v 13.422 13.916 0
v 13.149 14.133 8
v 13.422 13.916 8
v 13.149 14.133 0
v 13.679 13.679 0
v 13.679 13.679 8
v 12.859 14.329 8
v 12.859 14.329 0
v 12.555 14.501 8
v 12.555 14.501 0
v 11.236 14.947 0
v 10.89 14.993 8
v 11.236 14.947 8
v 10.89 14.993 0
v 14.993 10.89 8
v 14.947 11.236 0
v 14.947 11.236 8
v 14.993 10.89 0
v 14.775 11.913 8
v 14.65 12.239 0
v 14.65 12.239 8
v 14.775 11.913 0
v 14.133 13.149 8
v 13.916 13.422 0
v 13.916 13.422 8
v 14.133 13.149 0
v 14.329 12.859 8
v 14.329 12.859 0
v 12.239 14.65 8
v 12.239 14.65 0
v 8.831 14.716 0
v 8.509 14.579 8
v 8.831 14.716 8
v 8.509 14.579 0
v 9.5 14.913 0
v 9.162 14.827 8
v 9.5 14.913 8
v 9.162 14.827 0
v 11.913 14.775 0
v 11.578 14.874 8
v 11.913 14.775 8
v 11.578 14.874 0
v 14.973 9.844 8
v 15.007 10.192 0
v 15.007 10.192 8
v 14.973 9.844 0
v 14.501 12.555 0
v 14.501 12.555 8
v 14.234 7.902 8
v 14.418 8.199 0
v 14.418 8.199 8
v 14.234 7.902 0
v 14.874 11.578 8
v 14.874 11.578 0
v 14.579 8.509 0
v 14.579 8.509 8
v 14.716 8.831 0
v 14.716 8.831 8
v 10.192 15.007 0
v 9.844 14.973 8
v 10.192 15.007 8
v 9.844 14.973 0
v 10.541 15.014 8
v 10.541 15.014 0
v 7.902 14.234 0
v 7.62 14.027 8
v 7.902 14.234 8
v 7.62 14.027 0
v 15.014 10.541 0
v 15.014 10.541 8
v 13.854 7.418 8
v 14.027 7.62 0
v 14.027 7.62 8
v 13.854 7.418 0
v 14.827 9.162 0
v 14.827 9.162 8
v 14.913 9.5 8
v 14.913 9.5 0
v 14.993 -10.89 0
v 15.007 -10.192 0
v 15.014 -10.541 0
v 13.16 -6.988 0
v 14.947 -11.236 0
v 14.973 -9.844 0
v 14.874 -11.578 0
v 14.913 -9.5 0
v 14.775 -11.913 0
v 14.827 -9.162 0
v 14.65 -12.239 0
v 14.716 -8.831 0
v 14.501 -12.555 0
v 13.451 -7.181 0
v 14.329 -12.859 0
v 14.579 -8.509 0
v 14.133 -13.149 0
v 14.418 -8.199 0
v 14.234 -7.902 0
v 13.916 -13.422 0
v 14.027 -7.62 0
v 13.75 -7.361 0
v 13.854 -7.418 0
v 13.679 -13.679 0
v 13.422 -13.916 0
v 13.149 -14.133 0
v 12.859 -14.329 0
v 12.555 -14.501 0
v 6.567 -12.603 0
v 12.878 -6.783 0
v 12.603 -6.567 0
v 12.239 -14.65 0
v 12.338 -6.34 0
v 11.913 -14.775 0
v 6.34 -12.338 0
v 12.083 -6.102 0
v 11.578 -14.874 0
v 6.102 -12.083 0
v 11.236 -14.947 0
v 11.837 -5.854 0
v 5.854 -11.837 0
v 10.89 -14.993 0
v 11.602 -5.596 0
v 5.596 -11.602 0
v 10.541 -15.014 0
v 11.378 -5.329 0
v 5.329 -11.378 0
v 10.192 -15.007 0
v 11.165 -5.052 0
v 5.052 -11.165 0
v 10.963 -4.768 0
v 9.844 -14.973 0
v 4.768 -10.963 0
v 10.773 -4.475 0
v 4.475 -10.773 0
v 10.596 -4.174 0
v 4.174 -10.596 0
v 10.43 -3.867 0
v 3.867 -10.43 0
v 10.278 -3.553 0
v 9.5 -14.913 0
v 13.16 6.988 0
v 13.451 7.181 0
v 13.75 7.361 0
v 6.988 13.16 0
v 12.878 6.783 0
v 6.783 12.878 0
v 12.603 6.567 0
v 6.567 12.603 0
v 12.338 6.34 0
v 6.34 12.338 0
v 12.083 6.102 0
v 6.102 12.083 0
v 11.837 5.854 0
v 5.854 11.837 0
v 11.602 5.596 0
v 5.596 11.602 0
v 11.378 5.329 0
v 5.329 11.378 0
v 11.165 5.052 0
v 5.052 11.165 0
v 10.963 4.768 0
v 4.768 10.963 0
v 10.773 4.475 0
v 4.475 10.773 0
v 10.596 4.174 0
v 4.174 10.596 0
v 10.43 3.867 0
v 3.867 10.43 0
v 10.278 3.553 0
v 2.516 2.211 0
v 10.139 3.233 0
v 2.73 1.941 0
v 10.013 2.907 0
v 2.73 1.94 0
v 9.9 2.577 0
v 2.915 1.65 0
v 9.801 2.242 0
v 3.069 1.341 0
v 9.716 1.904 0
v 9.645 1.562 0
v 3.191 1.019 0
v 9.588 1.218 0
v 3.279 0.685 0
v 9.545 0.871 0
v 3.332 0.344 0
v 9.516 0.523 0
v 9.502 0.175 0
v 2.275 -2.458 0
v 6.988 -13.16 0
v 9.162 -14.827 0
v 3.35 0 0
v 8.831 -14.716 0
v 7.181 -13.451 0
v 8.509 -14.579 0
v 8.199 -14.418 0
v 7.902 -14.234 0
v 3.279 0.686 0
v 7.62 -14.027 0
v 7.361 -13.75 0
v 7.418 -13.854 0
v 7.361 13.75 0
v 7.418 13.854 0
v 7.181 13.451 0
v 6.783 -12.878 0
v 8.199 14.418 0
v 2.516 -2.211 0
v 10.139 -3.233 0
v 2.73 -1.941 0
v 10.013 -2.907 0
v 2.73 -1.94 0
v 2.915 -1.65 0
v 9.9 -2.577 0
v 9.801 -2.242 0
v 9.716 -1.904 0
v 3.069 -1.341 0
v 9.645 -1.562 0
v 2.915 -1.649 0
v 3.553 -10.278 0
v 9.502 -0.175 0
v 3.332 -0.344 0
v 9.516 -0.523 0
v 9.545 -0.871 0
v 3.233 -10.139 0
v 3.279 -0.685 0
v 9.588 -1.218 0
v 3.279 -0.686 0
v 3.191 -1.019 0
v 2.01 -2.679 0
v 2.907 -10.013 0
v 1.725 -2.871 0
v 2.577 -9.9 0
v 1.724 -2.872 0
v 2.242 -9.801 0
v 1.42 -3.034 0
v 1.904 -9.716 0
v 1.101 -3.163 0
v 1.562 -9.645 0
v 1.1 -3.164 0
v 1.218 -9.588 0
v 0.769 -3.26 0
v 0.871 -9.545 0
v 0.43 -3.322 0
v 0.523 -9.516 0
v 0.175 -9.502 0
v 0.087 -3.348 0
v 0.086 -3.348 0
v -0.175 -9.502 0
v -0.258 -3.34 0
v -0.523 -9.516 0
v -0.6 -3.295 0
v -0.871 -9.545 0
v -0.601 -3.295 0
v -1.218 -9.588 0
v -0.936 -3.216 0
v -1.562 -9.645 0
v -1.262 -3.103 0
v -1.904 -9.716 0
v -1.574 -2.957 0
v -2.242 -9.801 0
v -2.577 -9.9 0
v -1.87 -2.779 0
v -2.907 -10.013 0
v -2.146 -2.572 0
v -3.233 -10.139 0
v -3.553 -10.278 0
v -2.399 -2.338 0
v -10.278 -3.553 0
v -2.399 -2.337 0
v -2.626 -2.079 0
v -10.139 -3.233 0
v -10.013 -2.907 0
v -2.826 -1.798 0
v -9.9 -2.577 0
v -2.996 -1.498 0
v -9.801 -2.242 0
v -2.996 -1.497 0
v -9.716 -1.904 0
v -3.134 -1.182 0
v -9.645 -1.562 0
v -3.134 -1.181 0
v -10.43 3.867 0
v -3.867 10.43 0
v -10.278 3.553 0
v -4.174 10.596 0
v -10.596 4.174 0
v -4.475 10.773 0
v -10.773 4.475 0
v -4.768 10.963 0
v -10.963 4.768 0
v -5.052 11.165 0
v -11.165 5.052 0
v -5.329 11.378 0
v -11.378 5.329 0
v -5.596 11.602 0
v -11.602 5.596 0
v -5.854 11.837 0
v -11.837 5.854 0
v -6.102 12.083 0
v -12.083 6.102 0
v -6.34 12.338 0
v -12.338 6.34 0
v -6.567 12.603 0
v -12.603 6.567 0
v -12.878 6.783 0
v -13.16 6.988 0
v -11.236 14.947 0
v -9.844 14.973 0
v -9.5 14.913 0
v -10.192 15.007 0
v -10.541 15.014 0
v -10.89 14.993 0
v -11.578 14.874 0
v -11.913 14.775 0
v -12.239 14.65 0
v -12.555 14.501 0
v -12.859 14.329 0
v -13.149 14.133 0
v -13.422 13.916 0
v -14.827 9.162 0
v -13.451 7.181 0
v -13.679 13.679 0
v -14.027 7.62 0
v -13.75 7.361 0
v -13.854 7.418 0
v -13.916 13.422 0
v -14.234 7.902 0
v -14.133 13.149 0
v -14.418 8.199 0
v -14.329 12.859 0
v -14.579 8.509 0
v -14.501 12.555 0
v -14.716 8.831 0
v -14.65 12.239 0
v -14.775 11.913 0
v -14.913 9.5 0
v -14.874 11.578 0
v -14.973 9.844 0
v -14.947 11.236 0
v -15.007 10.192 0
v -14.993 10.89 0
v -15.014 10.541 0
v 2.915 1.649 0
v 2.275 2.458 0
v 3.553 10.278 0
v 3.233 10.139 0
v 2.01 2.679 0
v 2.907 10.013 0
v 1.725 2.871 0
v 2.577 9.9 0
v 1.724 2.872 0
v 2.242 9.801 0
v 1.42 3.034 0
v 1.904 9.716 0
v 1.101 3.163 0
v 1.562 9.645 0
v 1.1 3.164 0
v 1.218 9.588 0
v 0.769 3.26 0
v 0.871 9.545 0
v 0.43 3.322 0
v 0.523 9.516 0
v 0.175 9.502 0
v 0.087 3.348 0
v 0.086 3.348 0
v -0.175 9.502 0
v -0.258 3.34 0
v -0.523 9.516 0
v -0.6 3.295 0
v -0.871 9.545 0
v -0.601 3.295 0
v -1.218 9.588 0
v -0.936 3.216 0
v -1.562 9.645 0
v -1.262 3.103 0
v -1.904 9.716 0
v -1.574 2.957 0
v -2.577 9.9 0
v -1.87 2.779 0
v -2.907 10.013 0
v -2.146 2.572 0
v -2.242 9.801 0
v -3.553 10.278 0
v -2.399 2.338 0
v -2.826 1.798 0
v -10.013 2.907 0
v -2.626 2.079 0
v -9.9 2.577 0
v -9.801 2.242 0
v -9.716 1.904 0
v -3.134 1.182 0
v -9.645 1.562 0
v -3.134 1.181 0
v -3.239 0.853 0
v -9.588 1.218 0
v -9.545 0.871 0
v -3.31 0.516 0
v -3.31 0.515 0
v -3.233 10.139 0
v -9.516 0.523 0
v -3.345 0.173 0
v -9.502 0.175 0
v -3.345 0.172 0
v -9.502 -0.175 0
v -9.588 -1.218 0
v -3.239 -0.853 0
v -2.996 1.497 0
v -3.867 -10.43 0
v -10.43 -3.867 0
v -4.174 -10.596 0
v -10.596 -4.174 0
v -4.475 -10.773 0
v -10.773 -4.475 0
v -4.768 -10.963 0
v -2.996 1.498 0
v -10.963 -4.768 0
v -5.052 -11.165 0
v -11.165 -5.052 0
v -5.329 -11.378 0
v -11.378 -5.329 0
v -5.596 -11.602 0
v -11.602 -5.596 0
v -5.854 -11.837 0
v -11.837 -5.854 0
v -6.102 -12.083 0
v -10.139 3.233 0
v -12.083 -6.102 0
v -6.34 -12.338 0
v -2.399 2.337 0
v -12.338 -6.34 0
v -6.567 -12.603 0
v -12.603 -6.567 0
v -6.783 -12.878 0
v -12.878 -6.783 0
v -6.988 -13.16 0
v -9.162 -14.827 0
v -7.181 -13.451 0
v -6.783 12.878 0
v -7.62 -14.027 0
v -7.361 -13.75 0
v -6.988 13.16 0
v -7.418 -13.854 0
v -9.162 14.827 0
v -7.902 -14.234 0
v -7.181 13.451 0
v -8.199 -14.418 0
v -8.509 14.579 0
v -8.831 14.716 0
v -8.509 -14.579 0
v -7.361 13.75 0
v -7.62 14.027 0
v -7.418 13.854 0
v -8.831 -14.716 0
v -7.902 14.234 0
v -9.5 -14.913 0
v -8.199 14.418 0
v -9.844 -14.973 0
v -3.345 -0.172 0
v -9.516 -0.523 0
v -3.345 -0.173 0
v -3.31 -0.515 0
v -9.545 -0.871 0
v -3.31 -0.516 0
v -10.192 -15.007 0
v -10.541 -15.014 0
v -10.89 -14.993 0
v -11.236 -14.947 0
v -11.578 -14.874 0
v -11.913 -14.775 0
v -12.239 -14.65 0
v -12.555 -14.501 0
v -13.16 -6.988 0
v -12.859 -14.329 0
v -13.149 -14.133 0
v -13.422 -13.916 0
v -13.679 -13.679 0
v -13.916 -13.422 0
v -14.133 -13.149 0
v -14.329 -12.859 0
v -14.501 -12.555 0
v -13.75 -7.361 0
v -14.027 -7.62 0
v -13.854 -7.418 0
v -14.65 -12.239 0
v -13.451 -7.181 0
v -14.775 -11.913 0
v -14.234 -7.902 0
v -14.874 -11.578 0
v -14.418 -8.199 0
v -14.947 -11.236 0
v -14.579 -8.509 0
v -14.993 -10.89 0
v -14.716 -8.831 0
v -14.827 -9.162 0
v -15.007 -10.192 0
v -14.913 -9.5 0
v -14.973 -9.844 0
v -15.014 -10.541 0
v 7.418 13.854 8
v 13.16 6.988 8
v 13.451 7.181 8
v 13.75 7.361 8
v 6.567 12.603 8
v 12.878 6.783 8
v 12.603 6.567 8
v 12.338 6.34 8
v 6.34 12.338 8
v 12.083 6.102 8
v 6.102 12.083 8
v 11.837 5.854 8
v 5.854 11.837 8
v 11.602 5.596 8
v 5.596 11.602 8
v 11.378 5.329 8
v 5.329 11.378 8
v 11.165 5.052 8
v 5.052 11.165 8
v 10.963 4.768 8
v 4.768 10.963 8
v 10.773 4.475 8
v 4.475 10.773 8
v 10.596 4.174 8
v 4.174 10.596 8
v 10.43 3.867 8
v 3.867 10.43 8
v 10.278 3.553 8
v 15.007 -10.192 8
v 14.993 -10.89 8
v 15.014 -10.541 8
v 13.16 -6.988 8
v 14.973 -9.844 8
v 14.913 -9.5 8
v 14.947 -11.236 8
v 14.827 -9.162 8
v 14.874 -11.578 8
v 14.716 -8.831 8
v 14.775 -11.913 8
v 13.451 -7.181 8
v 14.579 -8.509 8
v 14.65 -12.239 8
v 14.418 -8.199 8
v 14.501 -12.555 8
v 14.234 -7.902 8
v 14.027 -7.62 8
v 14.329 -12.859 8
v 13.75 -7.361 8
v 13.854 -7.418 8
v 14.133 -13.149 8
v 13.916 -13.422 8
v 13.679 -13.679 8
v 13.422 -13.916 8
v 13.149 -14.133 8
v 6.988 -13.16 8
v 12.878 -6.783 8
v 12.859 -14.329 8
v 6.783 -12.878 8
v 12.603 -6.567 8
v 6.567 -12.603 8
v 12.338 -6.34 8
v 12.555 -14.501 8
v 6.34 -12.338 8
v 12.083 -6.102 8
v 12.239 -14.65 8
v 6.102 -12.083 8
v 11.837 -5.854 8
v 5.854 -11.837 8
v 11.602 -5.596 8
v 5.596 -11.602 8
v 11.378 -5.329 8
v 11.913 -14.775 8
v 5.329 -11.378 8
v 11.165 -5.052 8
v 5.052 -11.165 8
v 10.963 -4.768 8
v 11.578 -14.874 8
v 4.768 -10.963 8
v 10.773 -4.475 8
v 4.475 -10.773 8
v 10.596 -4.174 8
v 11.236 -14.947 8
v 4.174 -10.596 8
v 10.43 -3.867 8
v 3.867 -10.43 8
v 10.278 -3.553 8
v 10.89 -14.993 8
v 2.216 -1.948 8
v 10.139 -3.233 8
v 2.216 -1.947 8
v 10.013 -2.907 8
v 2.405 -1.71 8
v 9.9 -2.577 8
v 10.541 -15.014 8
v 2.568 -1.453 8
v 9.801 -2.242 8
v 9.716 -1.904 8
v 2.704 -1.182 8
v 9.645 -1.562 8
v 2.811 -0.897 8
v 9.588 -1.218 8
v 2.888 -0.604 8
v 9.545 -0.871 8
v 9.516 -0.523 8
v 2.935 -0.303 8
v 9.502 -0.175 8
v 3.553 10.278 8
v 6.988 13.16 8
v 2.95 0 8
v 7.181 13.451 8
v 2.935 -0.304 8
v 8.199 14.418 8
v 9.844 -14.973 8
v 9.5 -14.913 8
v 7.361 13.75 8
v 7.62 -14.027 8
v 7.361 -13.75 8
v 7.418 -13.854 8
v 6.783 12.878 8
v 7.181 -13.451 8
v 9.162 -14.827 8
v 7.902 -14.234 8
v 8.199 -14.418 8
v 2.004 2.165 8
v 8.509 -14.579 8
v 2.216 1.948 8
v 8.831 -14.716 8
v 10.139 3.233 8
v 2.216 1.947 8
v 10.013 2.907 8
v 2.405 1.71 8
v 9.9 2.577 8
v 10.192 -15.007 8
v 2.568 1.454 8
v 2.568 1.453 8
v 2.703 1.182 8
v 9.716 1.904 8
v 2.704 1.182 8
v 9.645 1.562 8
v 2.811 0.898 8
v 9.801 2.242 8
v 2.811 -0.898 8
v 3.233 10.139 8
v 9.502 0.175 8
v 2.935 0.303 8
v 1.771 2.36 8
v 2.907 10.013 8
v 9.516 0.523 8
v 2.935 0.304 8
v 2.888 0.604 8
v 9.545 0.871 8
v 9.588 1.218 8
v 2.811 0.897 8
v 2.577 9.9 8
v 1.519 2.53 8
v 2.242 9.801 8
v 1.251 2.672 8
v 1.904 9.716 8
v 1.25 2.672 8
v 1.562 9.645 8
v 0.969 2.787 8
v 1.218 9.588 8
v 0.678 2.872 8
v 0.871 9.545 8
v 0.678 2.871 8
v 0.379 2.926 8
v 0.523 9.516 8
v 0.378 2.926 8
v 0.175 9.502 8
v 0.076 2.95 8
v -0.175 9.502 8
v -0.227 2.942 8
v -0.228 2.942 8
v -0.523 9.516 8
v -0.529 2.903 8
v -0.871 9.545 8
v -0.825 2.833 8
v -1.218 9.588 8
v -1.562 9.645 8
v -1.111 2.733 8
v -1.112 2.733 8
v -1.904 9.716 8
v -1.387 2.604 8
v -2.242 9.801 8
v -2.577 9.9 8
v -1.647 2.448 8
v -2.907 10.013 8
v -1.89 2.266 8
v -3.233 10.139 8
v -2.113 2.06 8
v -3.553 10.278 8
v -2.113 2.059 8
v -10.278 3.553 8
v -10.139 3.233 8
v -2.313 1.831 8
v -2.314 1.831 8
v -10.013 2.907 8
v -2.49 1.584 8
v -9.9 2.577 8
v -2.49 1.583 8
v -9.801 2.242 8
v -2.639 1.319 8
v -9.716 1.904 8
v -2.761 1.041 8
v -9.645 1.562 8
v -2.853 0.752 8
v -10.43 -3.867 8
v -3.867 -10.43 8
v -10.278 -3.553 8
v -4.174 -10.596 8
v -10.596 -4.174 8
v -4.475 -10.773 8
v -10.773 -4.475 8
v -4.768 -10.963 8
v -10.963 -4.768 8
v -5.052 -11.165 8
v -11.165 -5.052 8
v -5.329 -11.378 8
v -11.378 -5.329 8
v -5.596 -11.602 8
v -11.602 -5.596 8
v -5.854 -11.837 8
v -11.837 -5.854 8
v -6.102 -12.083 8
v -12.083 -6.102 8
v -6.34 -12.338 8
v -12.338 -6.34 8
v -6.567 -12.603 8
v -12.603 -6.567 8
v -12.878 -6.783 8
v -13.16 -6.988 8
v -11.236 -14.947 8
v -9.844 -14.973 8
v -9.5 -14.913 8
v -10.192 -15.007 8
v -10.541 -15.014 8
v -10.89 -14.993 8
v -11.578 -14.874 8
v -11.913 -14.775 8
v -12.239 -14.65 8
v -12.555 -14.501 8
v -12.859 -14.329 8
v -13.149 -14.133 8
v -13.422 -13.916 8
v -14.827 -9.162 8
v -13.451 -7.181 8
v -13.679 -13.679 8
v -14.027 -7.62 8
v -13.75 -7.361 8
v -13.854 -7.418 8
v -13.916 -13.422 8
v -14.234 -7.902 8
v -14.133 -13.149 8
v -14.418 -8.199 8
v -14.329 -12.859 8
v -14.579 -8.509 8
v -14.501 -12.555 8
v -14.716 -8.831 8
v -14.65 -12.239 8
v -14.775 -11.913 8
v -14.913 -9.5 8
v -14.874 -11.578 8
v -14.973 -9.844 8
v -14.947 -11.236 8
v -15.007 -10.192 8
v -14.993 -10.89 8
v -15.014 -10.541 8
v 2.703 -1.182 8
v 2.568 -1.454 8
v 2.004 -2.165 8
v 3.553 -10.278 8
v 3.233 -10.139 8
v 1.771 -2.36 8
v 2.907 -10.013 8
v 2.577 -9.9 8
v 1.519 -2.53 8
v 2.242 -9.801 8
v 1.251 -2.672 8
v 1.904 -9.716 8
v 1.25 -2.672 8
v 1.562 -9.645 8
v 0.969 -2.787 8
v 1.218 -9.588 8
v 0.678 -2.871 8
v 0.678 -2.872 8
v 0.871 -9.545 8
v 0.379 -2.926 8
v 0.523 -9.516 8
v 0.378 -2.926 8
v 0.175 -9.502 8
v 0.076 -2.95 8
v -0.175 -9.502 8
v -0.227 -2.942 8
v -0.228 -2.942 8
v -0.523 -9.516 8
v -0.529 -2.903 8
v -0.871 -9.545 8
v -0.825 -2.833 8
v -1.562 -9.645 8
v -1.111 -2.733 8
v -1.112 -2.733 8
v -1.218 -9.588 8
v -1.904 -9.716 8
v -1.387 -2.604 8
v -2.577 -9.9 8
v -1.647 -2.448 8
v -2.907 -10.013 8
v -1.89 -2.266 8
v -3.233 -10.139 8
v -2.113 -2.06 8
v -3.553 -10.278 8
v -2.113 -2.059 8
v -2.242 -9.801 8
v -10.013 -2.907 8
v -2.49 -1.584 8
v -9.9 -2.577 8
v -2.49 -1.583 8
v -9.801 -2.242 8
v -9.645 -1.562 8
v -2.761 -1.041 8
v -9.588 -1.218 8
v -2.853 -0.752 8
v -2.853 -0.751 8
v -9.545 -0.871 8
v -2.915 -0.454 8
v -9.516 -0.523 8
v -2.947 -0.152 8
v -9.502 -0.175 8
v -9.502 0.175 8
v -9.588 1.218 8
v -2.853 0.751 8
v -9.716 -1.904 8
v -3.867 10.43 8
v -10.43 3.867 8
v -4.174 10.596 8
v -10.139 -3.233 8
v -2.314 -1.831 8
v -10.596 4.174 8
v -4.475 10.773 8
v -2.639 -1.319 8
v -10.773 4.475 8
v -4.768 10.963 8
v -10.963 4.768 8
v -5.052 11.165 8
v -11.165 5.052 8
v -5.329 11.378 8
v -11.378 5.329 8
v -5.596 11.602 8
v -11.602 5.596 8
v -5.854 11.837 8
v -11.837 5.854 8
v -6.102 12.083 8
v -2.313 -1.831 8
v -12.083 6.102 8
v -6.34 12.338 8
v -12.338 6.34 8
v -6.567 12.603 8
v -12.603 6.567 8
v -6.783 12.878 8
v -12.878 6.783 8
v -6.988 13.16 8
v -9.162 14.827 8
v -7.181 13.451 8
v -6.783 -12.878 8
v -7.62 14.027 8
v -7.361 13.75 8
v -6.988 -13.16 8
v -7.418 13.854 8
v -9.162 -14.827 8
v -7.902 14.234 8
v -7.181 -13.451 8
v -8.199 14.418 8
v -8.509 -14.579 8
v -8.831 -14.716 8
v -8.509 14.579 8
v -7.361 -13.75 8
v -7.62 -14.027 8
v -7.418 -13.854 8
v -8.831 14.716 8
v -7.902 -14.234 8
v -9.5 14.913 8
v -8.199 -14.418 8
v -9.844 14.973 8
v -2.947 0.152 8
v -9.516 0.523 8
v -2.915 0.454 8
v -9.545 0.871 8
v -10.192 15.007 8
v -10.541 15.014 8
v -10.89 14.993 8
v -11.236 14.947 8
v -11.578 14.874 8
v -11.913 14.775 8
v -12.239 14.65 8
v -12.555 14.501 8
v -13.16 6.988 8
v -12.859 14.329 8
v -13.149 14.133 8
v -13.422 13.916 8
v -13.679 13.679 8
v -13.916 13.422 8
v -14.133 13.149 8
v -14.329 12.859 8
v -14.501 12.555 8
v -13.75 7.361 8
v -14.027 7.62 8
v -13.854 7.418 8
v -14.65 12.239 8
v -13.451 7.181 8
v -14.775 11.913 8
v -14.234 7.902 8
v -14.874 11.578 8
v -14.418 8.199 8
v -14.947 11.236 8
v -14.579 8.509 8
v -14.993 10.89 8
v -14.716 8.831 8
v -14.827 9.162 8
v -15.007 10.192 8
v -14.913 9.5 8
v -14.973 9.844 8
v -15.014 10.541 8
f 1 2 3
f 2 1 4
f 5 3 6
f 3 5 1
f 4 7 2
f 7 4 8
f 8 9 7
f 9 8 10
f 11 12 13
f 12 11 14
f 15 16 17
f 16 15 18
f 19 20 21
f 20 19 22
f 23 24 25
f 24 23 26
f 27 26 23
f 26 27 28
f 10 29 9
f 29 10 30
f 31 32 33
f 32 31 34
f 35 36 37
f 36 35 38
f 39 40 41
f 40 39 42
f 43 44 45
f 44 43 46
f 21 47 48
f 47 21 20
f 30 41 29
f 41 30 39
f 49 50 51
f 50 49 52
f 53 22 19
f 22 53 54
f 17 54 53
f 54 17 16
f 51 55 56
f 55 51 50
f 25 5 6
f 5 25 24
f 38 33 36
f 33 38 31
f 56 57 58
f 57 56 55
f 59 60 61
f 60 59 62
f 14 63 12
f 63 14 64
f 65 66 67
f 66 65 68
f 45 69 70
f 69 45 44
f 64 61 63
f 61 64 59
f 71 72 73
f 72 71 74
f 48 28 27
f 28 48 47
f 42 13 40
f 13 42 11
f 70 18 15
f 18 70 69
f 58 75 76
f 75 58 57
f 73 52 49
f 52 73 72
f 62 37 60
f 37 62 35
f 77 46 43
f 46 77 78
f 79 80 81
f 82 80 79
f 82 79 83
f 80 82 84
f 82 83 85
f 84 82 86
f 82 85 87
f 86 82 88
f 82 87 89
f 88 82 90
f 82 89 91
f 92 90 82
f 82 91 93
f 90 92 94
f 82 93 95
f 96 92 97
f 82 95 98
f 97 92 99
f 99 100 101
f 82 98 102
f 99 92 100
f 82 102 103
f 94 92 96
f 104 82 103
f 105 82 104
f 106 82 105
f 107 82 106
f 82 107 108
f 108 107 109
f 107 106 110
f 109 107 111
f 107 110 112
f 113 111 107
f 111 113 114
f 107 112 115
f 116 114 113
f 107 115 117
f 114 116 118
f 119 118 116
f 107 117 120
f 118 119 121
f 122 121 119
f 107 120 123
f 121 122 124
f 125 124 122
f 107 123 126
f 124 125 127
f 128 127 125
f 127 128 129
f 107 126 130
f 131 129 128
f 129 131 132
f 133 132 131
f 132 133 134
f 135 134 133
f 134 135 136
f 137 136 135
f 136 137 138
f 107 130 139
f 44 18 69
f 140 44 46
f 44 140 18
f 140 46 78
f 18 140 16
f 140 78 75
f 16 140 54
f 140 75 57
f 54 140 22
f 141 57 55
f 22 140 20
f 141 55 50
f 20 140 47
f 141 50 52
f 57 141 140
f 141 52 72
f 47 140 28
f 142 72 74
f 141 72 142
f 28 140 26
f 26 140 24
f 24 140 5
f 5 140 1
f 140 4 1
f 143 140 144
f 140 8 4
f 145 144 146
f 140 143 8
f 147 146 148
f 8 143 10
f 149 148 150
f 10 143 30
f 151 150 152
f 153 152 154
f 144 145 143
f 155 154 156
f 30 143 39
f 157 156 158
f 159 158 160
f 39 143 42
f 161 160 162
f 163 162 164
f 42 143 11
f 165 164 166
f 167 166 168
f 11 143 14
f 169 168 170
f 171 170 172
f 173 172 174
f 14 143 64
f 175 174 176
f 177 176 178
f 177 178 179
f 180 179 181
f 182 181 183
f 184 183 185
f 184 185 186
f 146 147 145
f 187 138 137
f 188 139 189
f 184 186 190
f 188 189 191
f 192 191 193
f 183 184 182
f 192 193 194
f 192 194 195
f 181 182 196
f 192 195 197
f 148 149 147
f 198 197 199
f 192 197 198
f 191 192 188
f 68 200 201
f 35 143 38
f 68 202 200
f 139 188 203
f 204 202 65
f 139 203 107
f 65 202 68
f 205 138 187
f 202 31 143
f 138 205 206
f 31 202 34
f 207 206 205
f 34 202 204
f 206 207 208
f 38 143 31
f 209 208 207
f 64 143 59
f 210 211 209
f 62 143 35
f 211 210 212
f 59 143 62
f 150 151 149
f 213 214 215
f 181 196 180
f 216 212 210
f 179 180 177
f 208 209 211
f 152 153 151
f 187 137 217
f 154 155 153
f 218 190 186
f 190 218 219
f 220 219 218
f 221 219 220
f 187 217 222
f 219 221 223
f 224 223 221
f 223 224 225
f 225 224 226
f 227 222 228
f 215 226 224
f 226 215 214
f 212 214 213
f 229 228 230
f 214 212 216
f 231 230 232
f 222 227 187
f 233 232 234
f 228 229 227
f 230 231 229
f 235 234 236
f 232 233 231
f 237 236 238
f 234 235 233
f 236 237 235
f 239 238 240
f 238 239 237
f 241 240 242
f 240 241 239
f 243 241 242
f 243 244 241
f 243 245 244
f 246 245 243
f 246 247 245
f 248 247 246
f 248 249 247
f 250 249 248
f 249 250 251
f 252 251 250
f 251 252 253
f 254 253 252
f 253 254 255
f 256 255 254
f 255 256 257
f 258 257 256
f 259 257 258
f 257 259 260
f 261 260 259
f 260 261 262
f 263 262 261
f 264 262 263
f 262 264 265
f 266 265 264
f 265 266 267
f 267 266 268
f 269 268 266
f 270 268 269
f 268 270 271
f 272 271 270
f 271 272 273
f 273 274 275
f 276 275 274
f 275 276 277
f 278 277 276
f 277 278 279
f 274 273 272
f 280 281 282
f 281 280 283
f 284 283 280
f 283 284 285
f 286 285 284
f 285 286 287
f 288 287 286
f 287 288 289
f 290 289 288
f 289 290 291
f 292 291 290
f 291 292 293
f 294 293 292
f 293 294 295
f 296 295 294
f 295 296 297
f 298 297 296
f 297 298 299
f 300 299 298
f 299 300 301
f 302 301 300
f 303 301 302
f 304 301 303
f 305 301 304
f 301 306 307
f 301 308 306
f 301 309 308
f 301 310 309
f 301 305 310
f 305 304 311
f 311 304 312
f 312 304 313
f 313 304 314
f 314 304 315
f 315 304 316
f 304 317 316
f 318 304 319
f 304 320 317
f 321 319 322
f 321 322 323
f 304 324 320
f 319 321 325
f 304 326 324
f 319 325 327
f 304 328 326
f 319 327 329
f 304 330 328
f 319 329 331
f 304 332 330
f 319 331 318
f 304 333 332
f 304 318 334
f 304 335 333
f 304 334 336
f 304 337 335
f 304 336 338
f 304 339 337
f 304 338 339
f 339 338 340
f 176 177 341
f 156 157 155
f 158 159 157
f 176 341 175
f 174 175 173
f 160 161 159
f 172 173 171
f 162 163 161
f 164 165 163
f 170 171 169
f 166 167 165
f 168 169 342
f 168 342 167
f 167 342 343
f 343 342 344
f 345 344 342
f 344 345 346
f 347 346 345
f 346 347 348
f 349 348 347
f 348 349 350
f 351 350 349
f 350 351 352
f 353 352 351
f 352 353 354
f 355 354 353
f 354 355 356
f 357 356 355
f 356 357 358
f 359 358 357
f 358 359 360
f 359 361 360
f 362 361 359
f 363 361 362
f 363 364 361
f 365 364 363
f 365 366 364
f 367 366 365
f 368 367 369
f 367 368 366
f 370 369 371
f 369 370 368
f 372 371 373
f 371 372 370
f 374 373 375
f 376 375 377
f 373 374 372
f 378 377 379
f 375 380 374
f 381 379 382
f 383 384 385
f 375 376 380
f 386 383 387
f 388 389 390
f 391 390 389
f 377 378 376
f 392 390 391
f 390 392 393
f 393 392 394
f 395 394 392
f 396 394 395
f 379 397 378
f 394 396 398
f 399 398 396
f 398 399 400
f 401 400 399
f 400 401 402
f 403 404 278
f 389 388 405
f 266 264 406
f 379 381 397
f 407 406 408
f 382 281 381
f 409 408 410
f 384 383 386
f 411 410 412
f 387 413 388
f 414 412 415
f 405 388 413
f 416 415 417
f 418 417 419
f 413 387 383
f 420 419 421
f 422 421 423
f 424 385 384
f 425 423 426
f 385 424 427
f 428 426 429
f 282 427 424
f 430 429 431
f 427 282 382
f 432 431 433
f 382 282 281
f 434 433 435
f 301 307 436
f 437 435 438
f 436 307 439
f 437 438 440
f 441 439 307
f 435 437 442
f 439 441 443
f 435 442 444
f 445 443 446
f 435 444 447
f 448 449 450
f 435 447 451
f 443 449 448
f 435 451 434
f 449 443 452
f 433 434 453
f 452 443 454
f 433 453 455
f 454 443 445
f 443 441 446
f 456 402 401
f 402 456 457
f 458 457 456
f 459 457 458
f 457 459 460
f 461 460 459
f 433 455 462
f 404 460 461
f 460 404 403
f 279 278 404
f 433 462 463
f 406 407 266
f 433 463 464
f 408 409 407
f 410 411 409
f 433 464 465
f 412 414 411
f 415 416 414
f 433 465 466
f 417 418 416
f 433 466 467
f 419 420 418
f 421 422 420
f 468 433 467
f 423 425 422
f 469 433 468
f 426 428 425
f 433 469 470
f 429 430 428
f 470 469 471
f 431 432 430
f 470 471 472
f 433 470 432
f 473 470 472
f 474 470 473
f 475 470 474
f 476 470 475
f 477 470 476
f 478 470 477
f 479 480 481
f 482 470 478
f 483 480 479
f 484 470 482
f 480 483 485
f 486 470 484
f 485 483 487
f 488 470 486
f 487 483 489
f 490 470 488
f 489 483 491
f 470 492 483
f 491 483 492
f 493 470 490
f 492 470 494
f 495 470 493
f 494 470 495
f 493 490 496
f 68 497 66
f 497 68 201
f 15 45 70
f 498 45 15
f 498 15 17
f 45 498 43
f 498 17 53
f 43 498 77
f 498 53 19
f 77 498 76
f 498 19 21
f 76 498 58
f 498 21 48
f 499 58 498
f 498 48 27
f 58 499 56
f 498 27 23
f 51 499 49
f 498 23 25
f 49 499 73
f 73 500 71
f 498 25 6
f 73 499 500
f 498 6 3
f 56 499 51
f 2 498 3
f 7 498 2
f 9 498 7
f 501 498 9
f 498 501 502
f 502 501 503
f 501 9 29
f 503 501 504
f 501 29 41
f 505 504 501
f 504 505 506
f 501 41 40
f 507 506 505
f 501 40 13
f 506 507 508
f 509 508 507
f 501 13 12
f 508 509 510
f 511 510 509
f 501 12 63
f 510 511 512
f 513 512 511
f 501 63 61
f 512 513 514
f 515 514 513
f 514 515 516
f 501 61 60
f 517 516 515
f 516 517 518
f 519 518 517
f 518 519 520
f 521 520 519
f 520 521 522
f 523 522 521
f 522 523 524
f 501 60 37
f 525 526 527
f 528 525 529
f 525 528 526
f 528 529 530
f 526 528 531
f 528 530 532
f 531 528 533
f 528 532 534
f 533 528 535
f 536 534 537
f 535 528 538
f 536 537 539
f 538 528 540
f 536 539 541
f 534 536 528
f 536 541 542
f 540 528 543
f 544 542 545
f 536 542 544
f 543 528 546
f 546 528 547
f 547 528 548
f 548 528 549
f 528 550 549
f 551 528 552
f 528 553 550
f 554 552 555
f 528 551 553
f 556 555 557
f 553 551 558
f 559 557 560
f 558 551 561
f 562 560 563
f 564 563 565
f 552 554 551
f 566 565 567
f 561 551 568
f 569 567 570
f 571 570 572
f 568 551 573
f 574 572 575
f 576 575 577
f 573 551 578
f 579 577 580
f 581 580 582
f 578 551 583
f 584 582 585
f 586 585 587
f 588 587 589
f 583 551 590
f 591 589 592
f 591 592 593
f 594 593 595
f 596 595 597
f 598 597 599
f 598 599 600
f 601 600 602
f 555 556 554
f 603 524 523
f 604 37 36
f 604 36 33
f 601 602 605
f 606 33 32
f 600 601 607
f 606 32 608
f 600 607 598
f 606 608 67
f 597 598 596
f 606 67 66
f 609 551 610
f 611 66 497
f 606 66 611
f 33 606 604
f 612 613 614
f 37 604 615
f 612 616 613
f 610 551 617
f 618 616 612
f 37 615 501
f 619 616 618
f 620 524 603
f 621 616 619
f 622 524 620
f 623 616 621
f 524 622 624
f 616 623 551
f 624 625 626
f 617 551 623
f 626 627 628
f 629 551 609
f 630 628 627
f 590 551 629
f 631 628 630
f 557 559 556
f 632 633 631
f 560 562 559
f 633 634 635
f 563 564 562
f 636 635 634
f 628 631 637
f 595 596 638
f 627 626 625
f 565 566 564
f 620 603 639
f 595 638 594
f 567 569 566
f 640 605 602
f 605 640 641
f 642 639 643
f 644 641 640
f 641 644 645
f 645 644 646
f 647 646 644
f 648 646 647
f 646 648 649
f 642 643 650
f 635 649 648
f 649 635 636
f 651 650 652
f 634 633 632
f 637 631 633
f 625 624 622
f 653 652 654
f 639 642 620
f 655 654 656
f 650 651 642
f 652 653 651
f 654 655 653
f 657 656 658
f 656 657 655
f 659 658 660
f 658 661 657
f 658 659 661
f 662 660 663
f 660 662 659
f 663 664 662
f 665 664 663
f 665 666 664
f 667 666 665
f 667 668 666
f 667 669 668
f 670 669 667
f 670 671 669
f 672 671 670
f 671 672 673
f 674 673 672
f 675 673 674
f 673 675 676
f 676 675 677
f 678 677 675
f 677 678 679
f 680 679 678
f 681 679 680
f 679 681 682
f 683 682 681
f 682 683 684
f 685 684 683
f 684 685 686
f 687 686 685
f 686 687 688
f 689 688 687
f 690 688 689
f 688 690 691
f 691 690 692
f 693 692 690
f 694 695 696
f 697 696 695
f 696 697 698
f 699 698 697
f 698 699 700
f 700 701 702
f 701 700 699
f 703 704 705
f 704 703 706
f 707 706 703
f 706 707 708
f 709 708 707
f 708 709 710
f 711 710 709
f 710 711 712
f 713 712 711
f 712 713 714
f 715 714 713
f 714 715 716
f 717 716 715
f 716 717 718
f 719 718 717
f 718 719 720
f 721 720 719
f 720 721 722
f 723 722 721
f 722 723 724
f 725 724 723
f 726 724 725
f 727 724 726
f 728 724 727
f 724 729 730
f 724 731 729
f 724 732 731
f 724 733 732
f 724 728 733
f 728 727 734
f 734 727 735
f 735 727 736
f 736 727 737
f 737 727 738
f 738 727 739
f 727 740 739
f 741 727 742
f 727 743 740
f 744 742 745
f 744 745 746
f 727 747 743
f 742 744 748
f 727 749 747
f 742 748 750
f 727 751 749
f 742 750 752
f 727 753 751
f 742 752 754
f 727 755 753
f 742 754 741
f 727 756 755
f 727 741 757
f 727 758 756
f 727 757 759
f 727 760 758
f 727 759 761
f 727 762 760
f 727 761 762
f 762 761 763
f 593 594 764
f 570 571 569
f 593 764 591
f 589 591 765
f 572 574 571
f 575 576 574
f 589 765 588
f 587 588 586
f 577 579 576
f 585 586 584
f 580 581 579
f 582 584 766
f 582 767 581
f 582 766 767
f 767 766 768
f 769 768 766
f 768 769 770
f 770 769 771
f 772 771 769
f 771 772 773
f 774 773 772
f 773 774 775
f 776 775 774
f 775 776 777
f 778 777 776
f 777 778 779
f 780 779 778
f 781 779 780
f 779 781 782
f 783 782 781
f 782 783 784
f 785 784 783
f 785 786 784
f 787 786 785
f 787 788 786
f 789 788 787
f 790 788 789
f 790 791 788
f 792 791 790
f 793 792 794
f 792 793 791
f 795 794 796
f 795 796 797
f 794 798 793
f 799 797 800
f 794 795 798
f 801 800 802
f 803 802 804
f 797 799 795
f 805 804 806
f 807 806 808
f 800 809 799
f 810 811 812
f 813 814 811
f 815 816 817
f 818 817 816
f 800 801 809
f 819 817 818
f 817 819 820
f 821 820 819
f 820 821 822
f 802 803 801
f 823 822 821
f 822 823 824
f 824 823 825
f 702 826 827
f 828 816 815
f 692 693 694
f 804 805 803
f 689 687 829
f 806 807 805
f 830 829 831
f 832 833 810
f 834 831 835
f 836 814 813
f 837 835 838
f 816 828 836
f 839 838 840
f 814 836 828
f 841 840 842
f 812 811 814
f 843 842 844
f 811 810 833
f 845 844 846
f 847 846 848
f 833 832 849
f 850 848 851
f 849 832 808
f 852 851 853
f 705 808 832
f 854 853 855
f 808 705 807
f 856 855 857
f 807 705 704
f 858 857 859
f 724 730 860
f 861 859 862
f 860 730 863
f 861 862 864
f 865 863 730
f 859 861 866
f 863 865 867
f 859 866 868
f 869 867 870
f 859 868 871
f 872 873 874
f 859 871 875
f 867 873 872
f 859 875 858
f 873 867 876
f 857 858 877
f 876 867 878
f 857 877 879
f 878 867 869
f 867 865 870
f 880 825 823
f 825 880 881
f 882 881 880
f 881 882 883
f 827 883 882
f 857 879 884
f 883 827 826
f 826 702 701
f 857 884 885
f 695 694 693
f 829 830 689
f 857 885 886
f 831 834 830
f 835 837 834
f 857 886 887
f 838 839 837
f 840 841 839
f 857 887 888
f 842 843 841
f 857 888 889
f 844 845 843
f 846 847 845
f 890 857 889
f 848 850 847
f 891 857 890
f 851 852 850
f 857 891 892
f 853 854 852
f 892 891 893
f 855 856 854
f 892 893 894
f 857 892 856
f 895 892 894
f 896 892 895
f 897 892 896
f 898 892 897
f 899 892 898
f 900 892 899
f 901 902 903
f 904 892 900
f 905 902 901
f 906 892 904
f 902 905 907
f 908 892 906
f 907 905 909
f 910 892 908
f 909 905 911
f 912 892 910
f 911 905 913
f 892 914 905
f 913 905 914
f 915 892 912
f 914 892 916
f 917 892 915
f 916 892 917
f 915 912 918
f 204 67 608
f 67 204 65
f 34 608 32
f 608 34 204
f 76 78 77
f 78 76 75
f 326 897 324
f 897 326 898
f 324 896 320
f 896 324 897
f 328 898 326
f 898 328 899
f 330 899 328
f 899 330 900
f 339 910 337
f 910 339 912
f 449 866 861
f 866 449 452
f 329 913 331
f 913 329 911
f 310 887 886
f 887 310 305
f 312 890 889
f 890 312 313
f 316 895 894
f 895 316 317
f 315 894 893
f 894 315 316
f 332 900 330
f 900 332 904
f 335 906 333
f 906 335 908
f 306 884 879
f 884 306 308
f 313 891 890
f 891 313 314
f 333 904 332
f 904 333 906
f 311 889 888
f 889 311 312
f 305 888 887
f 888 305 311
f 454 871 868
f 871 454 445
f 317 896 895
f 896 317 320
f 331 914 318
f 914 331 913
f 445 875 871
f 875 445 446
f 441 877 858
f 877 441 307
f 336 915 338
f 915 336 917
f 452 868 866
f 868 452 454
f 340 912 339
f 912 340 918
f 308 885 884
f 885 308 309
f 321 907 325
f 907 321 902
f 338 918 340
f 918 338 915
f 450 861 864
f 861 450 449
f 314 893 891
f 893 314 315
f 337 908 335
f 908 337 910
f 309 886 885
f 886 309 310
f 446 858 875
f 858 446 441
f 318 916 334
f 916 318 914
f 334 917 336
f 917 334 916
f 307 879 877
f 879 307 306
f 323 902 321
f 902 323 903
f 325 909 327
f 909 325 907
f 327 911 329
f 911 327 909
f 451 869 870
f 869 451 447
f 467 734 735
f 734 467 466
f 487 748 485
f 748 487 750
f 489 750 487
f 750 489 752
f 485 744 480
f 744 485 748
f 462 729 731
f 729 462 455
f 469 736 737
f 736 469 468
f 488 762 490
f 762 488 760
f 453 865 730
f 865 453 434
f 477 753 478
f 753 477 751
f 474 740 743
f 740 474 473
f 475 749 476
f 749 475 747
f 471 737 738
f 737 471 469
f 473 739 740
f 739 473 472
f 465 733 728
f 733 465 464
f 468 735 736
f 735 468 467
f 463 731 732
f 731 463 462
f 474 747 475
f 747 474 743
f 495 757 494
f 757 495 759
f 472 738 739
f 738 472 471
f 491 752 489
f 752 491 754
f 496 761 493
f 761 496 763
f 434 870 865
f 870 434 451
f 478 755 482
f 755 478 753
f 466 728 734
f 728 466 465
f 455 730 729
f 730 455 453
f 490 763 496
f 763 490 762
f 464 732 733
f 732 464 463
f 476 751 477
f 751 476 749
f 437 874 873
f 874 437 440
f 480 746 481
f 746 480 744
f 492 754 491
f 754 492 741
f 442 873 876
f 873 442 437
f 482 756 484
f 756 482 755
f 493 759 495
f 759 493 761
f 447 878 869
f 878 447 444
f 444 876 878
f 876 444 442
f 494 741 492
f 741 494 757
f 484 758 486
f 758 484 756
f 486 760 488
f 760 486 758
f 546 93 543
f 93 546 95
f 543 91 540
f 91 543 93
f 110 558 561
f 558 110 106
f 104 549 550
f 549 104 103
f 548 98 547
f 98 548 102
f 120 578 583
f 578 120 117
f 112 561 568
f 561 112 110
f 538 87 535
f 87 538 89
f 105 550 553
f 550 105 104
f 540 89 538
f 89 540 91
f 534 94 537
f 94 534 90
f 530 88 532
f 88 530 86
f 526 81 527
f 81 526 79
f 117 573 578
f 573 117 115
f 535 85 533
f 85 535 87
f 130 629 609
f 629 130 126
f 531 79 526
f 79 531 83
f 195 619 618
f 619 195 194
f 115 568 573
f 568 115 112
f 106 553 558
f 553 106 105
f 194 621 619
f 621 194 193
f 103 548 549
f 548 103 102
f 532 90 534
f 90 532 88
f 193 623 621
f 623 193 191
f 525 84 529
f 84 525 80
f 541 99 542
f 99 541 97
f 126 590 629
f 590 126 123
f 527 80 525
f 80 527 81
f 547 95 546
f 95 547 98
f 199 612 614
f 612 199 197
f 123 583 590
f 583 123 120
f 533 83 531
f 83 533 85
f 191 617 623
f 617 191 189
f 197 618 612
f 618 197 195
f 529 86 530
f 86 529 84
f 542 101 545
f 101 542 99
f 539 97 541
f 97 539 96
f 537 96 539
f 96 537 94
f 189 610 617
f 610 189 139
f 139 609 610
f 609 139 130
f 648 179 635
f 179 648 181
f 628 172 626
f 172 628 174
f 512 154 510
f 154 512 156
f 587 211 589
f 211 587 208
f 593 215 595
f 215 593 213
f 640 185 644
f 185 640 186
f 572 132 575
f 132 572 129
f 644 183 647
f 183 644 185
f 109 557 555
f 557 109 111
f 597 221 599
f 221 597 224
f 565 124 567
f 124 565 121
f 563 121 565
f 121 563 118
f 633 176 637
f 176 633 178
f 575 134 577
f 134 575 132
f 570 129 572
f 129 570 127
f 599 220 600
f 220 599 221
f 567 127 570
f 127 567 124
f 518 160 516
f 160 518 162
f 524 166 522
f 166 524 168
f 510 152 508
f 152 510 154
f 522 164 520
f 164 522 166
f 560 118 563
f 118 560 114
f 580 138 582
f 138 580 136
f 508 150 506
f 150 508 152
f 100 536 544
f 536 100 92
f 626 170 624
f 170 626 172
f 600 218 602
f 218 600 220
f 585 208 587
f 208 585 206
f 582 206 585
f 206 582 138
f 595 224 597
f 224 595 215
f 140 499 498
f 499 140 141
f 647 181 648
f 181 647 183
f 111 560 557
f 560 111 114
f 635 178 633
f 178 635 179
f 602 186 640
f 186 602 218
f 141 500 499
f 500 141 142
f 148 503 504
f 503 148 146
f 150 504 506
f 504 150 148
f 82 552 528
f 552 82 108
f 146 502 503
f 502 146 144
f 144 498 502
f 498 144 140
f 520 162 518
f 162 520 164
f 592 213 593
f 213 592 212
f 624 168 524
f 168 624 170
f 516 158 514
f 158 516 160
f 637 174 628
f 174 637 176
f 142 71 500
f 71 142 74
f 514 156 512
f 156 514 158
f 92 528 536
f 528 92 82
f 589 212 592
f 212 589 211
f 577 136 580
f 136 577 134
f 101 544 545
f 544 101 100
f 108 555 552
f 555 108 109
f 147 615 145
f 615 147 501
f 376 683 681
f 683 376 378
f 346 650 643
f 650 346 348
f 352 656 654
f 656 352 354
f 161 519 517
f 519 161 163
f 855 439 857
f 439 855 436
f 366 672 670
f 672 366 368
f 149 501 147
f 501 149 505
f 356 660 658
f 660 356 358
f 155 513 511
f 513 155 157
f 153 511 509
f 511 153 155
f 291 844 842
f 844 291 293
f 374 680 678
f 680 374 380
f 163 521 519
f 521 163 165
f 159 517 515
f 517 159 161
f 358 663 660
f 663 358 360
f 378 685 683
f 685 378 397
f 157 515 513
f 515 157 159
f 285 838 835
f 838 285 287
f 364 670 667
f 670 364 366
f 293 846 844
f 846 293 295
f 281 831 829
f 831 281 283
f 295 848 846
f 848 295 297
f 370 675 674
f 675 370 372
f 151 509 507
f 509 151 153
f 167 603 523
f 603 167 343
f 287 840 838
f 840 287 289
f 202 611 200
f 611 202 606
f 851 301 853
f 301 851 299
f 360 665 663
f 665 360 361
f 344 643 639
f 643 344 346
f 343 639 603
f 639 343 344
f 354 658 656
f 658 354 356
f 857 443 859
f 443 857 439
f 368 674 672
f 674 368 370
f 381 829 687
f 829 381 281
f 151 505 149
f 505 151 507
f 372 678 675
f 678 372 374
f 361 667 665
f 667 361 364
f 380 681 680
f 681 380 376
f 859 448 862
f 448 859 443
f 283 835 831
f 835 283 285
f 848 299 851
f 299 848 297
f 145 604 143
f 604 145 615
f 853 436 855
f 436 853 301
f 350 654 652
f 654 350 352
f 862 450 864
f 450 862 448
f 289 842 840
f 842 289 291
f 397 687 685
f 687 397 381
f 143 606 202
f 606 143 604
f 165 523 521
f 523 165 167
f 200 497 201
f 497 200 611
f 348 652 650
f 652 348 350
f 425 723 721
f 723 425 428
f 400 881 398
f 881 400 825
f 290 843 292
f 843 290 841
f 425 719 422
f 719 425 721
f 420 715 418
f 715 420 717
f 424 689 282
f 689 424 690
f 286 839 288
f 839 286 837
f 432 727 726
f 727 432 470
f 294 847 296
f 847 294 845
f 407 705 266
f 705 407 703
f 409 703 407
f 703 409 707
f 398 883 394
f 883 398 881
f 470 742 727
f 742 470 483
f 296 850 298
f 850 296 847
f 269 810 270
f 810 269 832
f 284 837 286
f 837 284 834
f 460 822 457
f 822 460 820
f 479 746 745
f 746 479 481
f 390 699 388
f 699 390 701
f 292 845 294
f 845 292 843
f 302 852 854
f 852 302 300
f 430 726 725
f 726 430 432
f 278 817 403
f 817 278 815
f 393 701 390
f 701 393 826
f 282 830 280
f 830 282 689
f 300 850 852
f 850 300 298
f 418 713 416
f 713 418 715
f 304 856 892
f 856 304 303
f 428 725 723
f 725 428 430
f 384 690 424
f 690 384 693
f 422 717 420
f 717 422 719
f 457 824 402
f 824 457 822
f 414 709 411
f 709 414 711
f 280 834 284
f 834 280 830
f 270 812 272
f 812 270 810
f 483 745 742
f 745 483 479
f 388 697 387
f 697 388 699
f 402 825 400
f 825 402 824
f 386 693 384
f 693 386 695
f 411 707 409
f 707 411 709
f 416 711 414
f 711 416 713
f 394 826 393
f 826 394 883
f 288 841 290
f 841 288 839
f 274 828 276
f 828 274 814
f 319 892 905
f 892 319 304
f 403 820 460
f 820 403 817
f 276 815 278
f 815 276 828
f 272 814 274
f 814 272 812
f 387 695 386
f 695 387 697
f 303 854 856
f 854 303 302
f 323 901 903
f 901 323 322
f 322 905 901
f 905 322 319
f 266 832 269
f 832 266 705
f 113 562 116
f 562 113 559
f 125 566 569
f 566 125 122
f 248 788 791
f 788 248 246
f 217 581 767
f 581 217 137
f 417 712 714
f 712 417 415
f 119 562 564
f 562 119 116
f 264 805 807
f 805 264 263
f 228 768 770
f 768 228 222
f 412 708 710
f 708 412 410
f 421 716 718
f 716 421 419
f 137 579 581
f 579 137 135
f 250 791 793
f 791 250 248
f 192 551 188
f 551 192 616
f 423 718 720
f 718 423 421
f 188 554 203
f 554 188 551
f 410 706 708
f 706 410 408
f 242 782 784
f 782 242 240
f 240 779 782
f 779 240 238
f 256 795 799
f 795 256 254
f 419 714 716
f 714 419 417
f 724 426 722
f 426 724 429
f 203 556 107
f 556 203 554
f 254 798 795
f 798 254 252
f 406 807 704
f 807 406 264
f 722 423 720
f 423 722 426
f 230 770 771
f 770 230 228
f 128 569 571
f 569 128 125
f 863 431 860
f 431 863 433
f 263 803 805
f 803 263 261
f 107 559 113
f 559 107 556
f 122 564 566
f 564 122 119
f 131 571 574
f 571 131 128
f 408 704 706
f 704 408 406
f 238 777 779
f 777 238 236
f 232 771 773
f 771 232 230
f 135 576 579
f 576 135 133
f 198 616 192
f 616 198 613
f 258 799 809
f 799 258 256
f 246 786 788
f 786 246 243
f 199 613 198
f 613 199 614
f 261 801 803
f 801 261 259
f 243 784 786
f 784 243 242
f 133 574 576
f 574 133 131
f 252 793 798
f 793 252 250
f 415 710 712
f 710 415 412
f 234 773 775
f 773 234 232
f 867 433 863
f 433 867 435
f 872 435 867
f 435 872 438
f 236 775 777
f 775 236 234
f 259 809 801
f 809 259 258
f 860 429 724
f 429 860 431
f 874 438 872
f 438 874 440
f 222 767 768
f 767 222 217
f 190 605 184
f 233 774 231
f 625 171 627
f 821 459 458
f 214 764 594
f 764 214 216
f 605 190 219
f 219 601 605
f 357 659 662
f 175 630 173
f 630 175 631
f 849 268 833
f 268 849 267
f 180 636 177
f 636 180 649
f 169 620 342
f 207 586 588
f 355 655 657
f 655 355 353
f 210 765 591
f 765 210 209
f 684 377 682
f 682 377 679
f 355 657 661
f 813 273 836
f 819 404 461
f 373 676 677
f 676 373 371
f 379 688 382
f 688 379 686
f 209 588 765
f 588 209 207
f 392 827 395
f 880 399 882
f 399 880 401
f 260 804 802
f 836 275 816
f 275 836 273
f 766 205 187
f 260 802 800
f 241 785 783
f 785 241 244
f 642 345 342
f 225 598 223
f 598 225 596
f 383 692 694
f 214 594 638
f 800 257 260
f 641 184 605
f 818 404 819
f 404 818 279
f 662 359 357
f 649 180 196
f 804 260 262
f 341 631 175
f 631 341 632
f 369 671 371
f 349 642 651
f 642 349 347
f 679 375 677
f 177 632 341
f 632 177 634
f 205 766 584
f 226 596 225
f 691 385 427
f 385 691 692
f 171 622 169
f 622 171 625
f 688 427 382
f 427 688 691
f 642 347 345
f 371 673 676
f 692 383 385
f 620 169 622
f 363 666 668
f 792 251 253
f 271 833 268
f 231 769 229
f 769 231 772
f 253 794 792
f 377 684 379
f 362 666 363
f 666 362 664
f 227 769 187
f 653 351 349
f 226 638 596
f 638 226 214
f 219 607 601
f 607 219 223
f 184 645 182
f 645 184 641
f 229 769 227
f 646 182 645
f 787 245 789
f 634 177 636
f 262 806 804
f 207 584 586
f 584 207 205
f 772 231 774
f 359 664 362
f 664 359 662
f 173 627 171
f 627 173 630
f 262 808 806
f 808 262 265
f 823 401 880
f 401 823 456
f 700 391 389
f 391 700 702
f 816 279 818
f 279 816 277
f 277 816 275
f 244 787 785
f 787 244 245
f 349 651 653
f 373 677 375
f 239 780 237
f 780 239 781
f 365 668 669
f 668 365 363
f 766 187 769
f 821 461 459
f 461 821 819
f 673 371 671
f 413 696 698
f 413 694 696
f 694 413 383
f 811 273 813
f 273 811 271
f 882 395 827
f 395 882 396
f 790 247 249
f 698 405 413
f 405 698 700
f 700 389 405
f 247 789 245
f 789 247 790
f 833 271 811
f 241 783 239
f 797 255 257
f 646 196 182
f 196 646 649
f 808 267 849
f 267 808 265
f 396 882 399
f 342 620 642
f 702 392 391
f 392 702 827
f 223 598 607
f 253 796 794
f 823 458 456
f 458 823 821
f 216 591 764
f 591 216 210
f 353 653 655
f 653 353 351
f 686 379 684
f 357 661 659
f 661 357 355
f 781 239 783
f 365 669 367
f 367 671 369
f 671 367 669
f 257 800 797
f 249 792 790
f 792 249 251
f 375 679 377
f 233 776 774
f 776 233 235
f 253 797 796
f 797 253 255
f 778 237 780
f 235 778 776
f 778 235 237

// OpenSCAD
$fs=0.35;
$fa=1;

function arclawcos(a,b,c) = acos((a*a+b*b-c*c)/2/a/b);

tol = 0.01;
nthumb = 4;
thumb = 17;
// no larger than 44/2
bigr = 15;
h=8;
ht = h+tol*2;
//axle1 = 6/2; // 1/4" = 6.35mm
//axle2 = 7/2;
axle1 = 6.7/2;
axle2 = 5.9/2;
off=3;
rinc = 360/nthumb;
thumbdeg = arclawcos(bigr, bigr+(thumb/2-off), thumb);
rdeg = rinc - thumbdeg;
round =  bigr *sin(rdeg/2);
echo ("roff=",round*cos(rdeg/2), "round=",round);
roff=0;
//roff = round*sin(rdeg/2);
roff = round-round*cos(rdeg/2);

// old hand picked values
////round = 9/2;
////roff=1.8;

echo ("thumbdeg=",thumbdeg, "rdeg=",rinc-thumbdeg);

tophath = 3;
//tophatr = bigr;
tophatr=0;

difference(){
  union() {
    // center
    cylinder(r=bigr, h=h);
    // round ends
    for (i=[0:nthumb]){
      rotate([0,0,rinc*i+rinc/2])
	translate([bigr-roff,0,0])
	cylinder(r=round, h=h);
    }
  }
  // cut out
  for  (i=[0:nthumb]){
    rotate([0,0,rinc*i])
      translate([bigr+off,0,-tol]){
      cylinder(r=thumb/2, h=ht);
//%      cylinder(r=thumb/2, h=ht);
    }      
  }
  // center hole
  translate([0,0,-tol])
    cylinder(r1=axle1, r2=axle2, h=ht);
}
// top hat
if (tophatr>0){
  translate([0,0,h]) intersection() {
     translate([-tophatr, -tophatr, 0]) cube([tophatr*2,tophatr*2,tophath]);
     translate([0,0,-tophatr+tophath]) sphere(r=tophatr);
  }
}
